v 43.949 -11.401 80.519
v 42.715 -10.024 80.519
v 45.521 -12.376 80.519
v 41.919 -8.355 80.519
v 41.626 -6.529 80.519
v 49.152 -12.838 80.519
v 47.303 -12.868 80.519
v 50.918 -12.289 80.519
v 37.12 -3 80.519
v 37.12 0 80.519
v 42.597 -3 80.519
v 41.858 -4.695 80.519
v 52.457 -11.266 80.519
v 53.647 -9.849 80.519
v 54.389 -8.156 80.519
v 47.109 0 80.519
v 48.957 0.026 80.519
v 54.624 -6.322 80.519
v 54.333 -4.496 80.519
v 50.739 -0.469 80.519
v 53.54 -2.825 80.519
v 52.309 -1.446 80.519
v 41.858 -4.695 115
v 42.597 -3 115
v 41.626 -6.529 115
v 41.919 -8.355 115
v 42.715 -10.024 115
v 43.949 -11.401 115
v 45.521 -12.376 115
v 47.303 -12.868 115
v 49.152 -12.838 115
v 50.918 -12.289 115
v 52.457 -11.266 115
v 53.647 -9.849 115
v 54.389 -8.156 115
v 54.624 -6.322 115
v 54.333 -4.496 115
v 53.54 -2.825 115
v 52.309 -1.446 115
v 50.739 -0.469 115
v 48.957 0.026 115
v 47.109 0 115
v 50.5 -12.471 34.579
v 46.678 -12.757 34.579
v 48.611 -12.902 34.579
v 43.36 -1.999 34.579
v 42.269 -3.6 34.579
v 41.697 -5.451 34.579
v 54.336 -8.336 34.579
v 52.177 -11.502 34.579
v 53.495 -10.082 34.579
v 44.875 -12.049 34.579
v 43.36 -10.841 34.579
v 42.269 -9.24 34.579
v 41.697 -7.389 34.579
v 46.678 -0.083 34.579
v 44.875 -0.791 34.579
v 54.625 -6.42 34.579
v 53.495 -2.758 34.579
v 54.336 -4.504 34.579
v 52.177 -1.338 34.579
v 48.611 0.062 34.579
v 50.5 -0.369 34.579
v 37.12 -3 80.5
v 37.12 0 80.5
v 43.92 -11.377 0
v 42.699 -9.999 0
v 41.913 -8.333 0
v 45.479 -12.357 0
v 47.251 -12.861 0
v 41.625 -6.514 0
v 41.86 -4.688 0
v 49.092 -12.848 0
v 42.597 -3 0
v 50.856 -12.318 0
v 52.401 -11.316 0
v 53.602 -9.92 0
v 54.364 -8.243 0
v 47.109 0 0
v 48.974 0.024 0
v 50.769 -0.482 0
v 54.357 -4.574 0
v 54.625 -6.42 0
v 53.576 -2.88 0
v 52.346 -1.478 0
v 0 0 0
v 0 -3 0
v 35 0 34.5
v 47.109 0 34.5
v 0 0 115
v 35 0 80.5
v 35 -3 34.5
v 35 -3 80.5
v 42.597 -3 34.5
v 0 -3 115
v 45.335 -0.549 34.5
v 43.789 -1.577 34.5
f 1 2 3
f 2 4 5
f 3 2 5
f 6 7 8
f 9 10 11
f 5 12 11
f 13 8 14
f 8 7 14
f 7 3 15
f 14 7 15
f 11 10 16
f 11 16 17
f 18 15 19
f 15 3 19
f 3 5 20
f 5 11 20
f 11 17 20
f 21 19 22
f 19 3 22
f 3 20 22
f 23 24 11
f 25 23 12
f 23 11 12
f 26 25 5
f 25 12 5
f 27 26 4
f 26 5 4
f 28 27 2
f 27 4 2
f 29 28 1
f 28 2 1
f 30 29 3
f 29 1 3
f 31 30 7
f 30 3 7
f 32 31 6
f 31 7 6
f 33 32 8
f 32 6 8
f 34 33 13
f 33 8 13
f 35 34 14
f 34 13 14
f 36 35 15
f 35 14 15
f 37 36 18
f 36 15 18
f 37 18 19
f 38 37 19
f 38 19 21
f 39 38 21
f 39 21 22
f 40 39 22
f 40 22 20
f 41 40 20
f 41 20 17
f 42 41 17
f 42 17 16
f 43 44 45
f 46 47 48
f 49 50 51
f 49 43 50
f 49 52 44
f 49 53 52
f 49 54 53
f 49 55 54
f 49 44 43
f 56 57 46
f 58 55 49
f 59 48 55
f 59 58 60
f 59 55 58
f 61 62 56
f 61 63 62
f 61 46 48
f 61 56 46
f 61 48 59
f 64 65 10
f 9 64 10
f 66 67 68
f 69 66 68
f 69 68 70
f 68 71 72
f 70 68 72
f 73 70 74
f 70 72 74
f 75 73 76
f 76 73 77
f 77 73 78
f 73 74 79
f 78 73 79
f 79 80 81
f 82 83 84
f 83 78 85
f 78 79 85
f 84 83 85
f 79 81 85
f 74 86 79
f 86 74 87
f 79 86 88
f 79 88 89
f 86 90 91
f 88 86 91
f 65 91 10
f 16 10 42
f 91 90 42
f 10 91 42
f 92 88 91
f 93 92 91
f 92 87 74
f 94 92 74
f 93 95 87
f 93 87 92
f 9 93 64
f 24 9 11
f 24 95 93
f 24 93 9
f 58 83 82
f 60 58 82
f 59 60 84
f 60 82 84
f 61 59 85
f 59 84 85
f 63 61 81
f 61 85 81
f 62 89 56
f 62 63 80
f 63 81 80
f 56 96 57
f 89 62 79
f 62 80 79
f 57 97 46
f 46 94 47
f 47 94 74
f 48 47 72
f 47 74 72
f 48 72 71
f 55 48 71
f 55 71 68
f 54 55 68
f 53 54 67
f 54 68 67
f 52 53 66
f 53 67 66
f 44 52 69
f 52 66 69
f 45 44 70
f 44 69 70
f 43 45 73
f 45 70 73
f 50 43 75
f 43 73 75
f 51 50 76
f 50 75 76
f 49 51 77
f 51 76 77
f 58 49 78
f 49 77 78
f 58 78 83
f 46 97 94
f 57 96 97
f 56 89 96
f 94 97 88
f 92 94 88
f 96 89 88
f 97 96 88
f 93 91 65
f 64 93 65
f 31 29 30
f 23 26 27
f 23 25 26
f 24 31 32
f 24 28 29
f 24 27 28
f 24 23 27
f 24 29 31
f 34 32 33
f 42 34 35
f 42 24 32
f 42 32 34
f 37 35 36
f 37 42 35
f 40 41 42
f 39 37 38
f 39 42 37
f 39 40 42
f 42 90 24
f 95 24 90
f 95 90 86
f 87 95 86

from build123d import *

# Parameters (mm, degrees)
F1_DEPTH = 3
F2_R     = 6.5
F3_DEPTH = 115
F4_W     = 28.374873
F4_H     = 45.940291
F5_DEPTH = 25
F6_DEPTH = 25


with BuildPart() as f1:
    # F0 (on Front) → F1 (new body)
    with BuildSketch(Plane.XZ):
        Polygon((0, 115), (0, 0), (48, 0), (48, 34.5), (35, 34.5), (35, 80.5), (48, 80.5), (48, 115), align=None)
    extrude(amount=F1_DEPTH)

    # F2 (on Top) → F3 (join)
    with BuildSketch(Plane.XY):
        with Locations((48.124816, -6.420063)):
            Circle(F2_R)
    extrude(amount=F3_DEPTH)

    # F4 (on Front) → F5 (cut)
    with BuildSketch(Plane.XZ):
        with Locations((51.307272, 57.549083)):
            Rectangle(F4_W, F4_H)
    extrude(amount=F5_DEPTH, mode=Mode.SUBTRACT)

    # F4 (on Front) → F6 (cut)
    with BuildSketch(Plane.XZ):
        with Locations((51.307272, 57.549083)):
            Rectangle(F4_W, F4_H)
    extrude(amount=-F6_DEPTH, mode=Mode.SUBTRACT)


solid = f1.part
